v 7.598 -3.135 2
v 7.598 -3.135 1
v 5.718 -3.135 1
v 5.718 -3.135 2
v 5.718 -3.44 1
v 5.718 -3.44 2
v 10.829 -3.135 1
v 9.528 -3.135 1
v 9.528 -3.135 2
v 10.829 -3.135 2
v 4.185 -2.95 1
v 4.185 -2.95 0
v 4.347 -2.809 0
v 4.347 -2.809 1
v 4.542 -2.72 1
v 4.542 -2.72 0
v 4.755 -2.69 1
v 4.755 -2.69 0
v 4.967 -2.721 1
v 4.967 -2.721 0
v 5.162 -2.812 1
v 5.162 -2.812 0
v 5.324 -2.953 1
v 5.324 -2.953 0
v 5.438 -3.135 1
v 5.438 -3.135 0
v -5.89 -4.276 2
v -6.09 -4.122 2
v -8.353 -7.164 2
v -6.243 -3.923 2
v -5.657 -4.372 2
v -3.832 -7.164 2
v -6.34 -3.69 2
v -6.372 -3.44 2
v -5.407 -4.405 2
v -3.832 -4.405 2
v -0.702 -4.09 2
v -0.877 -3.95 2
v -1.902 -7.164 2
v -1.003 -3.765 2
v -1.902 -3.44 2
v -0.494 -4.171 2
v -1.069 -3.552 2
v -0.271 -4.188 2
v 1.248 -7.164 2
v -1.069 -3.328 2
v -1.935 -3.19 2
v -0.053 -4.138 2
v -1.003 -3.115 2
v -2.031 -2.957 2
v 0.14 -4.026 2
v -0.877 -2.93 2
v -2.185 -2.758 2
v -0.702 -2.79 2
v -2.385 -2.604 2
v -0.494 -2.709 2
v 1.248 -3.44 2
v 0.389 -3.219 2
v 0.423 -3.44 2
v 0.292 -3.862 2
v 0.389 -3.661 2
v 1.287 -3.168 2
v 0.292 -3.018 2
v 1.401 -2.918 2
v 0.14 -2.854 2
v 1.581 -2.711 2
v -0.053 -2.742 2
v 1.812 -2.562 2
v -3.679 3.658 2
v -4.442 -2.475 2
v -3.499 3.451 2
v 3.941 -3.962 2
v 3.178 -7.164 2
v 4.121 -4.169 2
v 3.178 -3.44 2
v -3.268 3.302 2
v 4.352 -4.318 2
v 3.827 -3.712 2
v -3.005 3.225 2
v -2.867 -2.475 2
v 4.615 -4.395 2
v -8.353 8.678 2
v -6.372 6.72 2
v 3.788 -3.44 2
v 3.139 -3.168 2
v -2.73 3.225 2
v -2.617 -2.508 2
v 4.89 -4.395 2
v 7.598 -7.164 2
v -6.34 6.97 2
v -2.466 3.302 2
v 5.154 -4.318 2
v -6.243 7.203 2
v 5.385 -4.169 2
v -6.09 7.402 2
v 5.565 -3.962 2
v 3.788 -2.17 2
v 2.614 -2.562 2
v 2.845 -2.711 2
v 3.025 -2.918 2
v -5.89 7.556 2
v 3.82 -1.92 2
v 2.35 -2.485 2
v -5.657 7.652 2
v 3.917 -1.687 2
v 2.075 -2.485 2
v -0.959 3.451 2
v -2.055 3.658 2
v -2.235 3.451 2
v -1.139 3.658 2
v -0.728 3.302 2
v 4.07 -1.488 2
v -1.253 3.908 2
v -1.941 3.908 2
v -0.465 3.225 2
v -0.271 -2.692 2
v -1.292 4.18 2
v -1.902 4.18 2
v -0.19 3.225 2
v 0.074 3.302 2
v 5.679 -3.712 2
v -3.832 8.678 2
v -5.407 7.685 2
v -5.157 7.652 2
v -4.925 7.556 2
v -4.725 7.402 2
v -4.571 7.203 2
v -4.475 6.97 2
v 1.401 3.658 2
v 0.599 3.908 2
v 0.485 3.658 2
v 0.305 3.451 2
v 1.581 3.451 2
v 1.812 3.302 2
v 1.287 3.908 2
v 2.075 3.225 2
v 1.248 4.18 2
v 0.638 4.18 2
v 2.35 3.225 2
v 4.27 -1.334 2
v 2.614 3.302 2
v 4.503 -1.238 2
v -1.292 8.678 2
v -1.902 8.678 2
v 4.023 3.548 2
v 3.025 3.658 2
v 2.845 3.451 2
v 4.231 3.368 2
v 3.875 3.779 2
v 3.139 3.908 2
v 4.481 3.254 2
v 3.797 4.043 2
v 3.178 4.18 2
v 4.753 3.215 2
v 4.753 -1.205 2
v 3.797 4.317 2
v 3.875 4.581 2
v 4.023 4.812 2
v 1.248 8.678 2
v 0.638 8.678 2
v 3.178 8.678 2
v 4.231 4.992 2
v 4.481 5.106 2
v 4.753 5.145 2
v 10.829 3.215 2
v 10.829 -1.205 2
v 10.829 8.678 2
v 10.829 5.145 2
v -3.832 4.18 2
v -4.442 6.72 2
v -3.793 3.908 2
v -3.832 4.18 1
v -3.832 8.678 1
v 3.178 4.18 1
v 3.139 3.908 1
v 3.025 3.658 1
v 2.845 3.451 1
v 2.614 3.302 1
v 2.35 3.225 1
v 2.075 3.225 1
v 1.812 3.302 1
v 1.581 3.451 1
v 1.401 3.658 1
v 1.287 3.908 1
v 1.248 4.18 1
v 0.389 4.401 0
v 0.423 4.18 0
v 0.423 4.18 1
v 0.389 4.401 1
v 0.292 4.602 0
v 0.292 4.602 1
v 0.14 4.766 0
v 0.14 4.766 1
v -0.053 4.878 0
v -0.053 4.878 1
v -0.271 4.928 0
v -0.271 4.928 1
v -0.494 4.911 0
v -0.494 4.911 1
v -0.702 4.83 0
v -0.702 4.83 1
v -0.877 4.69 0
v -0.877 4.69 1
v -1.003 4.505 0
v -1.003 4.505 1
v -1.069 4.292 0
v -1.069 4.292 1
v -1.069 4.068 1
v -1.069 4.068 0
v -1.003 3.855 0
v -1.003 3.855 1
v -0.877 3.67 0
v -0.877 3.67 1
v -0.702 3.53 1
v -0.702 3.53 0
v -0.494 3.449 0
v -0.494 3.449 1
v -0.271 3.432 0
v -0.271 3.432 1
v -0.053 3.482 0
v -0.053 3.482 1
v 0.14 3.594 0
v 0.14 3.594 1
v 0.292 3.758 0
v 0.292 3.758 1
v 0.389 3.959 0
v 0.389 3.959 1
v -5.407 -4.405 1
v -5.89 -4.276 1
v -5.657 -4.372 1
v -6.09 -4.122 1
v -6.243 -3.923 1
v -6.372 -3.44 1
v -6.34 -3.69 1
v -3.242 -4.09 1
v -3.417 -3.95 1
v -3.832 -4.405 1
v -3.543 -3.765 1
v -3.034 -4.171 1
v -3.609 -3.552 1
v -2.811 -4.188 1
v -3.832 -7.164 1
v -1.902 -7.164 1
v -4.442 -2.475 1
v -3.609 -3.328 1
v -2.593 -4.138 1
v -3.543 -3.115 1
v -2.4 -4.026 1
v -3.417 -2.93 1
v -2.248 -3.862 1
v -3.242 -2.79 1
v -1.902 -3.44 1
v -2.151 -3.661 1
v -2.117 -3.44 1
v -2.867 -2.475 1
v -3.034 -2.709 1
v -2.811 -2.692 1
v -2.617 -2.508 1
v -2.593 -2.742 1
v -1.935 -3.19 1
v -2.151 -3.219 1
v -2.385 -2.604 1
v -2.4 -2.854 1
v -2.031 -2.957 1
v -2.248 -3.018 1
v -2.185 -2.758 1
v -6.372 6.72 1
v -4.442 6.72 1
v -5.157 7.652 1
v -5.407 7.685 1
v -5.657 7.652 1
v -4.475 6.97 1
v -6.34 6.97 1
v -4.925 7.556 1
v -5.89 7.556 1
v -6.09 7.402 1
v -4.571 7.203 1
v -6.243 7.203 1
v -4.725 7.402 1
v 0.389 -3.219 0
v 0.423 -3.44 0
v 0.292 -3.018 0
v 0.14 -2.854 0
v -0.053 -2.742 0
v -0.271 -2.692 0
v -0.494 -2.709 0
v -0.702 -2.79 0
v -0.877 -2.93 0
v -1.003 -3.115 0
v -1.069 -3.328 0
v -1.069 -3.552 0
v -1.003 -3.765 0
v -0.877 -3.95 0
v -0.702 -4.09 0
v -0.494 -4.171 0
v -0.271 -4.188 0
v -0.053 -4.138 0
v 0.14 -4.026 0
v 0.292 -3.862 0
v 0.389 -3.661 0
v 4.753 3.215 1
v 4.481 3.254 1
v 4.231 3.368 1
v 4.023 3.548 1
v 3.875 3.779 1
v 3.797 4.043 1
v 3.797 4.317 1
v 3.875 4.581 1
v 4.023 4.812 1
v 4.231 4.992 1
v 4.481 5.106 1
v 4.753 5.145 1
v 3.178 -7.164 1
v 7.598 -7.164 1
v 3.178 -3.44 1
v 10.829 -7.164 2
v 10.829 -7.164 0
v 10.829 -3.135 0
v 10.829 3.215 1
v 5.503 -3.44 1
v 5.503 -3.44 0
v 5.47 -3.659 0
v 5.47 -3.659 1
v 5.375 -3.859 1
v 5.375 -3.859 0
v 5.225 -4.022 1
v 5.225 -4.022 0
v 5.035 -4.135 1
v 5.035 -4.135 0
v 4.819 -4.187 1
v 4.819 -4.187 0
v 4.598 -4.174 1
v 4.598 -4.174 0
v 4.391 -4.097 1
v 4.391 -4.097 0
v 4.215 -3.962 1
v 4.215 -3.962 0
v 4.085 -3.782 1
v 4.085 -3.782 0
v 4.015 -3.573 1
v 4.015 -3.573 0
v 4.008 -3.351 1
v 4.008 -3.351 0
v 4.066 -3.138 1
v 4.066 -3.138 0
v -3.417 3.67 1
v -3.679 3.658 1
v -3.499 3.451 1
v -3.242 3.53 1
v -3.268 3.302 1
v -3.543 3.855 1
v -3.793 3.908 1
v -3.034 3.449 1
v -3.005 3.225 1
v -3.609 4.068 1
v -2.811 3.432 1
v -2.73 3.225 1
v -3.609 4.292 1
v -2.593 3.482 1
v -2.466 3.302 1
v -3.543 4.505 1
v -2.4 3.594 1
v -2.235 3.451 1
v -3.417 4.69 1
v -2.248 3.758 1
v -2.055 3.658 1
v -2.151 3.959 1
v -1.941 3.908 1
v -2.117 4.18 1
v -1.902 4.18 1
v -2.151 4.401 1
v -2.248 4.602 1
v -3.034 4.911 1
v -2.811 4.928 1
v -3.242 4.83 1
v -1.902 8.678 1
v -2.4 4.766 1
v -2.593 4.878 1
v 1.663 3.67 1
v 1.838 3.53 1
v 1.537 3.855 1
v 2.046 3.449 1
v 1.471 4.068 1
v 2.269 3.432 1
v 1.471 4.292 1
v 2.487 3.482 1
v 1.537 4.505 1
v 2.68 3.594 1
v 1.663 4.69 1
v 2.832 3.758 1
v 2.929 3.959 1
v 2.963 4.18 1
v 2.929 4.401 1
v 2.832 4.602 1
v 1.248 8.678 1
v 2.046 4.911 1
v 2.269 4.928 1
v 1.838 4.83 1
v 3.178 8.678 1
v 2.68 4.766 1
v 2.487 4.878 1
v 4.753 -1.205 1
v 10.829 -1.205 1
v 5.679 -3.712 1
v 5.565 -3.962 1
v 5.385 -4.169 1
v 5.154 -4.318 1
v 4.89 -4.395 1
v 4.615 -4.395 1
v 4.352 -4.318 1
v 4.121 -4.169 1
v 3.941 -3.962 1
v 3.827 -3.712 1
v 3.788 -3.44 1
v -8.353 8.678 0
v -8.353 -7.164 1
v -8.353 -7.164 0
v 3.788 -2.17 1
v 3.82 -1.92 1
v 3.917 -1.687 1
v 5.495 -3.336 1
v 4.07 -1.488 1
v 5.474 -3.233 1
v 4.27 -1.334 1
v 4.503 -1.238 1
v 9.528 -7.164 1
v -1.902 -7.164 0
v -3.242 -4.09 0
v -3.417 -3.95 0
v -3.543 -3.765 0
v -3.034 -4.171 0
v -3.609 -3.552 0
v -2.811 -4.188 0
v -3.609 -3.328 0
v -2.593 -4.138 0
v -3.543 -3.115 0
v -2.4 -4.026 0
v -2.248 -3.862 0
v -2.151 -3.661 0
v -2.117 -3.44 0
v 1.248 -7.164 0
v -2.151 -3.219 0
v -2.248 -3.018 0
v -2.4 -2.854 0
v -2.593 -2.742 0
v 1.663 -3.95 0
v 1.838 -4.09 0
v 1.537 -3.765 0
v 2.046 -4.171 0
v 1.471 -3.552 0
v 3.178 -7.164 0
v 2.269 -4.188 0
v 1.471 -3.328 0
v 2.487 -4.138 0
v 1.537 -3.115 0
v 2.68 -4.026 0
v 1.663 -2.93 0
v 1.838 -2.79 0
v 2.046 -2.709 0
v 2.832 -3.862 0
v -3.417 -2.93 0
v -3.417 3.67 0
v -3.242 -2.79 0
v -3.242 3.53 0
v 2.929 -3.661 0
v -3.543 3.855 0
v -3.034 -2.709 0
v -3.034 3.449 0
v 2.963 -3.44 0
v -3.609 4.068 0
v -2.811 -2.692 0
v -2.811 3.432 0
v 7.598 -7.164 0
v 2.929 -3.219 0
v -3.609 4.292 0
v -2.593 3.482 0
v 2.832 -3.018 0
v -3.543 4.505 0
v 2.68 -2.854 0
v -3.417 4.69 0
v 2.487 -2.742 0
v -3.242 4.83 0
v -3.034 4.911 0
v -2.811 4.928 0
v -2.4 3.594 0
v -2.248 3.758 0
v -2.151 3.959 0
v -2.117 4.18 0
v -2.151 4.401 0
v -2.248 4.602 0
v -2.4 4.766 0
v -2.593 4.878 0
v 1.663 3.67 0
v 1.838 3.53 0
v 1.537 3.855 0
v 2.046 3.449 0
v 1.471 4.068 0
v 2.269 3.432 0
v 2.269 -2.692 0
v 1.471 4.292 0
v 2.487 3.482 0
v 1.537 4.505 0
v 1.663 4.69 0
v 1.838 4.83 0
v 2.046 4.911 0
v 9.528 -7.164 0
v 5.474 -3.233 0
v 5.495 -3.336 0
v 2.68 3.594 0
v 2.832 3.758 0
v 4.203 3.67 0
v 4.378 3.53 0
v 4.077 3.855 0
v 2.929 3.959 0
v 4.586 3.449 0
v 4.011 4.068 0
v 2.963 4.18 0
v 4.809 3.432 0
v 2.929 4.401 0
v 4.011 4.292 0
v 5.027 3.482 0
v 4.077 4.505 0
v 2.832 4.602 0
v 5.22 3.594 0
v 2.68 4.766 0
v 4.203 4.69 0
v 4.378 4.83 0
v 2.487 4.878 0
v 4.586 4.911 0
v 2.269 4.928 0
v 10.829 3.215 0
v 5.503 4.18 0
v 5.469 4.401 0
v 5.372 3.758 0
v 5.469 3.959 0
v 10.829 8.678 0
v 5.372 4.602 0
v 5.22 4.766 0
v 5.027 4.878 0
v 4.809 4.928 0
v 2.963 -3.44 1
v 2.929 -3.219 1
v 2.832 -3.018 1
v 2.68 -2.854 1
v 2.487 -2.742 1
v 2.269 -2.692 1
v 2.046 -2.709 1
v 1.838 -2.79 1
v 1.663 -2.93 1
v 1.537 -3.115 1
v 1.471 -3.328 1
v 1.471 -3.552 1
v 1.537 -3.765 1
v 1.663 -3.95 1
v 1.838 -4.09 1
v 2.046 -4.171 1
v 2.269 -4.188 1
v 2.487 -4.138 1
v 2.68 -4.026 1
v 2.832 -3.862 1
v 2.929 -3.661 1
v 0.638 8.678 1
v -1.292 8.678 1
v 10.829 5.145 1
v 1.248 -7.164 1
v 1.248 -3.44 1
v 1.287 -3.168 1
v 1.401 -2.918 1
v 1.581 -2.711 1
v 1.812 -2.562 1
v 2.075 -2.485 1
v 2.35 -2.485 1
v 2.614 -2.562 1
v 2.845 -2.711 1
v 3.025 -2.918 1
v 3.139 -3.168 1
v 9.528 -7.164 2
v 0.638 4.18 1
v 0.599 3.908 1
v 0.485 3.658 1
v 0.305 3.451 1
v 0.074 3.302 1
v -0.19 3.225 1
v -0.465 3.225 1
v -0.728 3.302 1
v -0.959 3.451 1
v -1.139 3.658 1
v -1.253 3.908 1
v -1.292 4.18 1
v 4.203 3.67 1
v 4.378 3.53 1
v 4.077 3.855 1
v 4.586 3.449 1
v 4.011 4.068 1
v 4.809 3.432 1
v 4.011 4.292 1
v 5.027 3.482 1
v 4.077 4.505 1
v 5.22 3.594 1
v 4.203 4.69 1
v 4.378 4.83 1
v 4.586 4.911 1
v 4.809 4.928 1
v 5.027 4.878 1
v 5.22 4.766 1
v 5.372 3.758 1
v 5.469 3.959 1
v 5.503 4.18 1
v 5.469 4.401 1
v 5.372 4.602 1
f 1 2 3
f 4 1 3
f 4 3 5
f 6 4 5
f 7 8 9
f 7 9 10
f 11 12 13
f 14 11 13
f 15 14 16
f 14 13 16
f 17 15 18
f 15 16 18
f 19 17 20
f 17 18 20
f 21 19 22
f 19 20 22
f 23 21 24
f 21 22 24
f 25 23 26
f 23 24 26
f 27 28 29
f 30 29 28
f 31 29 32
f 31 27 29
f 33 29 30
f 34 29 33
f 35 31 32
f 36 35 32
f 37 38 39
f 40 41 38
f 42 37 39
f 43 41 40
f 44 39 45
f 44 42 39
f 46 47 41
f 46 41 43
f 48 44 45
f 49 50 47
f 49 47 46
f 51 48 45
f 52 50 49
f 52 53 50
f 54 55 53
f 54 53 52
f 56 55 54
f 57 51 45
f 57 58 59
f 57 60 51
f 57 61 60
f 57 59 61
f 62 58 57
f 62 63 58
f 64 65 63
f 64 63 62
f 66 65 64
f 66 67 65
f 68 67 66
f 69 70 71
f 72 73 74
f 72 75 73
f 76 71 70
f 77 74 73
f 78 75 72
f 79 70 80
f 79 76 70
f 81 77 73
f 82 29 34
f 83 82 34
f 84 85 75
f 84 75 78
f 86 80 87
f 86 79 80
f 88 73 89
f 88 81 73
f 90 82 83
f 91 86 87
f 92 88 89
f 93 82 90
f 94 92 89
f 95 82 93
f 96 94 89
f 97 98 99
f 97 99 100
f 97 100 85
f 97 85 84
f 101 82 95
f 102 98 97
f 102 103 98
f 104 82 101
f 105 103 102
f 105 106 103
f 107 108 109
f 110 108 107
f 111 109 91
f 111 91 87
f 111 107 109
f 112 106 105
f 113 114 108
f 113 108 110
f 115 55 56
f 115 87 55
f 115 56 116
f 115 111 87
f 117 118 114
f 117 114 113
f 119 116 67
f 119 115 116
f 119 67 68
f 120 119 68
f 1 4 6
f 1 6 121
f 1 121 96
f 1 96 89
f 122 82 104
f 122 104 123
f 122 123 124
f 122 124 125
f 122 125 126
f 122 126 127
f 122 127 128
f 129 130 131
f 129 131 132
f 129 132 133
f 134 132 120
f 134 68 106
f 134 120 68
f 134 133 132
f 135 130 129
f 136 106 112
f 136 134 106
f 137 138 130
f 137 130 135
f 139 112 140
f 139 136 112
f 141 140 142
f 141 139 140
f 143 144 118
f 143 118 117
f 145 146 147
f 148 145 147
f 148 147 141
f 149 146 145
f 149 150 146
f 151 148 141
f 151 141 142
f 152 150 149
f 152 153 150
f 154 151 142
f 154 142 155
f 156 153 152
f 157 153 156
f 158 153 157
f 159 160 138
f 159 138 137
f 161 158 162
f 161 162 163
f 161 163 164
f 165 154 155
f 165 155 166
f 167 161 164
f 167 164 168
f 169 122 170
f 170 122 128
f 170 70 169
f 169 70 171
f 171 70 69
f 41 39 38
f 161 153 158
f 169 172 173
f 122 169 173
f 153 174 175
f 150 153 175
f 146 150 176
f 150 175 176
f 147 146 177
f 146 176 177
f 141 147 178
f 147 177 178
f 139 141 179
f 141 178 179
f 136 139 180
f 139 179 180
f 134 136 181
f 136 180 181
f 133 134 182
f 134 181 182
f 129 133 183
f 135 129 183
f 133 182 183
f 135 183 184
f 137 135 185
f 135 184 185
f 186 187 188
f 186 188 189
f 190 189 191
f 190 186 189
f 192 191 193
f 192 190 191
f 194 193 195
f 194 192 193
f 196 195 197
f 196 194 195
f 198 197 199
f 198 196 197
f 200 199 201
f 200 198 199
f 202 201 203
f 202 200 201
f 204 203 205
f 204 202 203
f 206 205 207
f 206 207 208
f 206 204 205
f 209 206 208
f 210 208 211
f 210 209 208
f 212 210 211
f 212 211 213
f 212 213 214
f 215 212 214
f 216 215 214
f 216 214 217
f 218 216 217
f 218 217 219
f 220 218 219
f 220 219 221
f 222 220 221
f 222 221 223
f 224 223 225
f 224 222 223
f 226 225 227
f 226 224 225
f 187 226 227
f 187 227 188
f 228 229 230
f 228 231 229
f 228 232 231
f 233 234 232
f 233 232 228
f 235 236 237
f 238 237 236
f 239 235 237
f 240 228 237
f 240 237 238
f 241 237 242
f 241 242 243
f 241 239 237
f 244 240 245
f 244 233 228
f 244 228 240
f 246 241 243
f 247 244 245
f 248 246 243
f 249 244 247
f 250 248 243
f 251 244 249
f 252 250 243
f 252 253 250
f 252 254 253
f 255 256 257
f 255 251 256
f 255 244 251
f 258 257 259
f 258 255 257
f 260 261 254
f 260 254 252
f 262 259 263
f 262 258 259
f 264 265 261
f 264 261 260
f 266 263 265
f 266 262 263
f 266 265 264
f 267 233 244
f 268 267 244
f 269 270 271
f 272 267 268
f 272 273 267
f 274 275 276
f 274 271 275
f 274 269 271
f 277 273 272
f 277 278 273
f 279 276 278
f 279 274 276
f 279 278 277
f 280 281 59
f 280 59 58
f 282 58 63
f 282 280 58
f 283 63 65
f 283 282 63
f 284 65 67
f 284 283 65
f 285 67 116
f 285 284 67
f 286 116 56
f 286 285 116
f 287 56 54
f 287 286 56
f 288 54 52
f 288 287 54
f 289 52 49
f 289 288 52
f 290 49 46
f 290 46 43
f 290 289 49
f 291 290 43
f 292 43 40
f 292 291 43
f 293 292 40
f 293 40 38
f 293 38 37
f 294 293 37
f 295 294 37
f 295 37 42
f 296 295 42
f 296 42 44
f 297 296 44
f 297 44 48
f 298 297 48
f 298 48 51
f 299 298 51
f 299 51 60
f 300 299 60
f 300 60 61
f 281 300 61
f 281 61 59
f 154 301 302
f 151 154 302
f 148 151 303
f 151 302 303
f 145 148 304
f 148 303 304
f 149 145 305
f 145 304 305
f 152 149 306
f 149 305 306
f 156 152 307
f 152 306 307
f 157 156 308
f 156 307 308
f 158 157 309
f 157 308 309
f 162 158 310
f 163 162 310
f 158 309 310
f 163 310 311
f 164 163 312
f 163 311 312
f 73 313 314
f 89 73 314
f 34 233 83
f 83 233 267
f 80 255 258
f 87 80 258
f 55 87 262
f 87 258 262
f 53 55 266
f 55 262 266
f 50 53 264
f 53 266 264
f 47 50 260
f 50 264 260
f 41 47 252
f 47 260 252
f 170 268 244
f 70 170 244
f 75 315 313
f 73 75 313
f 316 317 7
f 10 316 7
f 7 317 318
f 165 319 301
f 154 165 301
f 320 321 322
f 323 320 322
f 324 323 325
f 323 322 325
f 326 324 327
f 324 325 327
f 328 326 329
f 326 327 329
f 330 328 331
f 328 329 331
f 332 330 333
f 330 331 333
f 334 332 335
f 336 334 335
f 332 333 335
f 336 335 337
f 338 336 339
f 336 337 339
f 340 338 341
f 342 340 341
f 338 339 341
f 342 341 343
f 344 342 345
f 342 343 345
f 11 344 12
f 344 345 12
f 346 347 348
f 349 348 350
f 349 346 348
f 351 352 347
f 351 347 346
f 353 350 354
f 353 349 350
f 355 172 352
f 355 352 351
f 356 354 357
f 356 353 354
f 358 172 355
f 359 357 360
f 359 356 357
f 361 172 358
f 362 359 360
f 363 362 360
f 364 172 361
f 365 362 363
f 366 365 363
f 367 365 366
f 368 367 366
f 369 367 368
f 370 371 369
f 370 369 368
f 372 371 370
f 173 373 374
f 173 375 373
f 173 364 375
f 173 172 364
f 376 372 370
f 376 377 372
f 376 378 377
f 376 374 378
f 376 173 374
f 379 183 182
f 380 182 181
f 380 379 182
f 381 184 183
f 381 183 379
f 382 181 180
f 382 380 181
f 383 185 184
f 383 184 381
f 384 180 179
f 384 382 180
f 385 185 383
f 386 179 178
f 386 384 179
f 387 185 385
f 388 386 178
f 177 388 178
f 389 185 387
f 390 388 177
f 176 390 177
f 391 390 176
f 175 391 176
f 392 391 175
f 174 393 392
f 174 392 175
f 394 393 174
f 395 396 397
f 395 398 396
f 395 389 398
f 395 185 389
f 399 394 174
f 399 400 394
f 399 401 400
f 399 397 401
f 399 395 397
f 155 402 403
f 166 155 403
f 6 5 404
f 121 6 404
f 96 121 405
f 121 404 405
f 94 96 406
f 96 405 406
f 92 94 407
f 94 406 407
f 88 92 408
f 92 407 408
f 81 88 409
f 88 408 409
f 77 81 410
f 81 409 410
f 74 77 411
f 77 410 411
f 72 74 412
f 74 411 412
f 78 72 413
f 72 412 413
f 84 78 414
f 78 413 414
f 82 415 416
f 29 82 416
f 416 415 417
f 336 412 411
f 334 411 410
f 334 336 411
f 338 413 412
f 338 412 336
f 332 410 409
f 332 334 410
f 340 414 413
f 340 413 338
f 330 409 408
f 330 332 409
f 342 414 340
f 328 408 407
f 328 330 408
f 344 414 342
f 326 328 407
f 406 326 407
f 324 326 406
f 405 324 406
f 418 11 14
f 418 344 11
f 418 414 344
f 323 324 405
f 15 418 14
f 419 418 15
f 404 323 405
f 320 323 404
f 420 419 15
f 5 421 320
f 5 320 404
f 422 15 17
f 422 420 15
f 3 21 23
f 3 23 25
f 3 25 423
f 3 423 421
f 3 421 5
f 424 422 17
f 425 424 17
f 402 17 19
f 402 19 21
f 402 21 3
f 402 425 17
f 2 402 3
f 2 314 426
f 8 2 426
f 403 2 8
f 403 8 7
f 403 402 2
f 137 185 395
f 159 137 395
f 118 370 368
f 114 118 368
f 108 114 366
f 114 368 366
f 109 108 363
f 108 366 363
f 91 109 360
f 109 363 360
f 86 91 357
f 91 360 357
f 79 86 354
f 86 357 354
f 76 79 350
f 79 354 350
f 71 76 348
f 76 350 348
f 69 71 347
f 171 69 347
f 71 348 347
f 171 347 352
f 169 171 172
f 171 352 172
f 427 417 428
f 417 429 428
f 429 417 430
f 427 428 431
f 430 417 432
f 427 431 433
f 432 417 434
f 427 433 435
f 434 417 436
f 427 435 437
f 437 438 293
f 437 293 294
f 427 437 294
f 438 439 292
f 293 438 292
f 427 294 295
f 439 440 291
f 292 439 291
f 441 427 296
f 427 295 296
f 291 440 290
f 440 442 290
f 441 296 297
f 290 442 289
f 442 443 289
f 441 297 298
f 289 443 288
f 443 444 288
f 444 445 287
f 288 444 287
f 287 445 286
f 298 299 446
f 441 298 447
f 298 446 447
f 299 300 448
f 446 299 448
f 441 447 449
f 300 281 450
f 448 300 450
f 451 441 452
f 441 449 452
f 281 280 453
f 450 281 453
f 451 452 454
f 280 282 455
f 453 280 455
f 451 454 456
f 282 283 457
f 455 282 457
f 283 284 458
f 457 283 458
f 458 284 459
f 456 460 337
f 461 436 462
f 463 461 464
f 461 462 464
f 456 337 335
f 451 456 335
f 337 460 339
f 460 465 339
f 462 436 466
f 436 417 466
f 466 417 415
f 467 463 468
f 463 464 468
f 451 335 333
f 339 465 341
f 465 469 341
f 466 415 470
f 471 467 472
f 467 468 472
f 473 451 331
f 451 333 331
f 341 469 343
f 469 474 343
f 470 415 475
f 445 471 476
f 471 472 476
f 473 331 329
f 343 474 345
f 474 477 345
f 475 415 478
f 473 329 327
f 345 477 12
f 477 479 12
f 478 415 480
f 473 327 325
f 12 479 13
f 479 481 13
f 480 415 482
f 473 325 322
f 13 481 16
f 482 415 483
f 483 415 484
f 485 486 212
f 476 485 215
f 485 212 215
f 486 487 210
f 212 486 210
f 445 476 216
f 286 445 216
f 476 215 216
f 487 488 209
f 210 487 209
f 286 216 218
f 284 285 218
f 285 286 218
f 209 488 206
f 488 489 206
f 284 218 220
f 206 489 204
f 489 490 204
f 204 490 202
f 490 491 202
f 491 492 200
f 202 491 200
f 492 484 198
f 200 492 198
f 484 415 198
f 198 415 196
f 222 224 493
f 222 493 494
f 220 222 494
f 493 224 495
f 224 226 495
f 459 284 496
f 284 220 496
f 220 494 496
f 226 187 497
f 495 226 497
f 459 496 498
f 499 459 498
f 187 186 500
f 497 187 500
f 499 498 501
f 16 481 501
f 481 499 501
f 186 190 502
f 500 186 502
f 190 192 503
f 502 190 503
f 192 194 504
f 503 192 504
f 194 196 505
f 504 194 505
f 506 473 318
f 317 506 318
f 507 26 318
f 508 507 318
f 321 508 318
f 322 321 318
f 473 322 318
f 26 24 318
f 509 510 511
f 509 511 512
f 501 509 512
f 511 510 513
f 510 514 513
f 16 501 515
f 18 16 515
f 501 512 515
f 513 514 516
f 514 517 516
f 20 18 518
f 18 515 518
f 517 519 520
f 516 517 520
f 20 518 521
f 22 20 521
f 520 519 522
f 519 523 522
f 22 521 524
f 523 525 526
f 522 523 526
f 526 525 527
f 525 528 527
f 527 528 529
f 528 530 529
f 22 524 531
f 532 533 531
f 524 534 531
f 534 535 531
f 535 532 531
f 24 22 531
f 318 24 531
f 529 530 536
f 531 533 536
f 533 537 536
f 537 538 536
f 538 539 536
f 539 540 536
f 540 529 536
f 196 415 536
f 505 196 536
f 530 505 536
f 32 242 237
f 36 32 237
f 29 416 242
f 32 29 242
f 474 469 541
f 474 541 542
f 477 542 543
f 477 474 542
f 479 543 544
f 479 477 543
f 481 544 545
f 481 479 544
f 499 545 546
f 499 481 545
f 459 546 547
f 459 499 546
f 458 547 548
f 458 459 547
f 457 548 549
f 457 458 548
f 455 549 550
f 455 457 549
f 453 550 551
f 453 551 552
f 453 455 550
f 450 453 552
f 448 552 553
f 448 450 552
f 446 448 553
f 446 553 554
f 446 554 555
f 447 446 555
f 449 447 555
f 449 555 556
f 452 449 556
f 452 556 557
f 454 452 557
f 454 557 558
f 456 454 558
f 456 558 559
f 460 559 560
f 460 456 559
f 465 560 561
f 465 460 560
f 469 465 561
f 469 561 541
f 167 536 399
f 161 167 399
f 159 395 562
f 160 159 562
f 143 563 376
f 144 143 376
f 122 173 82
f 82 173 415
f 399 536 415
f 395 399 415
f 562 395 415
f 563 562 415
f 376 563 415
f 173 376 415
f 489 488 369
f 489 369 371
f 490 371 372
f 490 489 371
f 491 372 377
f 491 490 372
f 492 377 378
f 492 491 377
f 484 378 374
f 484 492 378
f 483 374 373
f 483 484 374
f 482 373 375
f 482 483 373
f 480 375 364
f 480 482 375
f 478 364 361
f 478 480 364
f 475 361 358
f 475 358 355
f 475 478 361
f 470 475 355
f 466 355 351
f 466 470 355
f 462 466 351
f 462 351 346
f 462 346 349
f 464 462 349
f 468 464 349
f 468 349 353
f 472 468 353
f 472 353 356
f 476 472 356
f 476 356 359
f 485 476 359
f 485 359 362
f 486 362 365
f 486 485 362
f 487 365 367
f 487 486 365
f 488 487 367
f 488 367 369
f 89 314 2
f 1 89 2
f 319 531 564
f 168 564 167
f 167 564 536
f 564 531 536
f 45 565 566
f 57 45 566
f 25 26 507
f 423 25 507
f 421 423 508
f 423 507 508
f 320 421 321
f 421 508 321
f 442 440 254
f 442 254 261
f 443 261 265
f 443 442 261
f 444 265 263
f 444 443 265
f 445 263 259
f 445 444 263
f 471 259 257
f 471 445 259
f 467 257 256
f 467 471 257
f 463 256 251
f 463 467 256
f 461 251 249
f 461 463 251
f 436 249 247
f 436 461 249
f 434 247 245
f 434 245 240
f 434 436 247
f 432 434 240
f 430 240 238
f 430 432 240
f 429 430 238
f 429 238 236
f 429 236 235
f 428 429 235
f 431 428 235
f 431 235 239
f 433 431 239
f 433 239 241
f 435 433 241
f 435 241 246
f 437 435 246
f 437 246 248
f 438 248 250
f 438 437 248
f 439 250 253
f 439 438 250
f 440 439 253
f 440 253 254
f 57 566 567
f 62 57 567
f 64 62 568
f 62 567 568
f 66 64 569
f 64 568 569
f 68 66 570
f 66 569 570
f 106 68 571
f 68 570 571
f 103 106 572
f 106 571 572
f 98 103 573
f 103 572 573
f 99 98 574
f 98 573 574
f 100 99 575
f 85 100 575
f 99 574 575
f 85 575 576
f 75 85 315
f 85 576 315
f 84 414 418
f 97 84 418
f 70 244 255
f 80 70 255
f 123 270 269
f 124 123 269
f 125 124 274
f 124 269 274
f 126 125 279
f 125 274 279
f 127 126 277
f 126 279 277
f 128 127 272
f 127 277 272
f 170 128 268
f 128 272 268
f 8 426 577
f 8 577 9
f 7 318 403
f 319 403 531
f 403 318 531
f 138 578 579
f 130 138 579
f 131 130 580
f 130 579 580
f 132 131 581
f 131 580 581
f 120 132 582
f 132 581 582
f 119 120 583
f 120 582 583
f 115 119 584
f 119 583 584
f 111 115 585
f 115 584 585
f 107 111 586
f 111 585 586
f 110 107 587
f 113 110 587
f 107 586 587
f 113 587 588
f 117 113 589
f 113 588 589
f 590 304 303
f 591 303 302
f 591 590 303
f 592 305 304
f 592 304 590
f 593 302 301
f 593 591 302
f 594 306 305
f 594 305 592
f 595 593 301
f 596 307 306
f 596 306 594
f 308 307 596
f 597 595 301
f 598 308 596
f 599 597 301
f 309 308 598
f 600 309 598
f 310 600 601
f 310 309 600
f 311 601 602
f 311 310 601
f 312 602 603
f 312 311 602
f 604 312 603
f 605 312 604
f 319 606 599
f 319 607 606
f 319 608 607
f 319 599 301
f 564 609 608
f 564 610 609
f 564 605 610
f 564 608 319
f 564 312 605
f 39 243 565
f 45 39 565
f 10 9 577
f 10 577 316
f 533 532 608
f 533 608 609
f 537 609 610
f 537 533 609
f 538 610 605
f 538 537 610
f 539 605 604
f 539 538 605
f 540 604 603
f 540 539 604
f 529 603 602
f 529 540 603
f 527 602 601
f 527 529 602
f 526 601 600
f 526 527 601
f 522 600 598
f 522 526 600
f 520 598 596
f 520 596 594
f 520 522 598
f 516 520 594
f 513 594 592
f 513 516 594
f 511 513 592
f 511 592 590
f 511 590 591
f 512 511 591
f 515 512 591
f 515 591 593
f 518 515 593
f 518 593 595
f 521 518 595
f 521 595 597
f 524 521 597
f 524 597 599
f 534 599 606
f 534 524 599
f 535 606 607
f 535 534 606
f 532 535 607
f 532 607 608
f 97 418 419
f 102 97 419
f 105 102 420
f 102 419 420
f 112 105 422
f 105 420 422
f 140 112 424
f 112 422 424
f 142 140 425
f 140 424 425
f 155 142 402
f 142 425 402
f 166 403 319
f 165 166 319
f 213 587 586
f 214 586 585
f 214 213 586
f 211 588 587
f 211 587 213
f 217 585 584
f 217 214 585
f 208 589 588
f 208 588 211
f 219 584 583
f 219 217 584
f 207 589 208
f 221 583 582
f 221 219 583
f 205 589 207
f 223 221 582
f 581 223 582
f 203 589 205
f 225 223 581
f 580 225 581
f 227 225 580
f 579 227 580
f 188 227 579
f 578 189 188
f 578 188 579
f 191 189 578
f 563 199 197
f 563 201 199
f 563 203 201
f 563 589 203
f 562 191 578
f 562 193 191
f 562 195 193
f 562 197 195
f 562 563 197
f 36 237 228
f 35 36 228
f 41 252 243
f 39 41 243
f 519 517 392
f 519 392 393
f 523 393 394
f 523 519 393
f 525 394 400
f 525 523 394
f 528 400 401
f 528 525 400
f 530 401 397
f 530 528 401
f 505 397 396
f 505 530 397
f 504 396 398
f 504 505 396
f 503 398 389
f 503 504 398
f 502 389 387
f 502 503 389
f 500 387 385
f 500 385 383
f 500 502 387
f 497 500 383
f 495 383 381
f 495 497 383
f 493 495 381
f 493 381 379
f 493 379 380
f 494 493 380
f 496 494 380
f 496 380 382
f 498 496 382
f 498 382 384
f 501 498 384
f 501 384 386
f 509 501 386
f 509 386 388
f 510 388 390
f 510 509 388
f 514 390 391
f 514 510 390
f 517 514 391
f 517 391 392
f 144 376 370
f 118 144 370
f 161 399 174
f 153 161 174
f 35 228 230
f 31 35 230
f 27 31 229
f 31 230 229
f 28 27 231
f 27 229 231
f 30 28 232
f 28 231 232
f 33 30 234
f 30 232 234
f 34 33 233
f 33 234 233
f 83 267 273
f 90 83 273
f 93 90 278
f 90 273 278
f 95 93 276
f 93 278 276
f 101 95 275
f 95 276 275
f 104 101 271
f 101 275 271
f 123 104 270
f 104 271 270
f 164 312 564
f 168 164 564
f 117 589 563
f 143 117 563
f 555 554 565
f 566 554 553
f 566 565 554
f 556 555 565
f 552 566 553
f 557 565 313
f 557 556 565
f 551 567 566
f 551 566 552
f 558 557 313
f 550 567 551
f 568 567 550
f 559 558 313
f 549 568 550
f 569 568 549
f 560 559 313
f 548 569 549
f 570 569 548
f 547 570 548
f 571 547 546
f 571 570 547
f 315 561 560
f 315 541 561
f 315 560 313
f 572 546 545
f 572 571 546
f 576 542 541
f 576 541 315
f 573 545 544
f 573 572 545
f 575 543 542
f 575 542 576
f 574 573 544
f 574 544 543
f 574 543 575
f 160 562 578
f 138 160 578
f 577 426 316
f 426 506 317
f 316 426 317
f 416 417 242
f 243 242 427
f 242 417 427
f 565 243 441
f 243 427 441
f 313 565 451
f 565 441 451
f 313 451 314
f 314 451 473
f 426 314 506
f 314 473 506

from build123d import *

# Parameters (mm, degrees)
F0_R     = 0.75
F0_W     = 1.3011230478
F0_H     = 4.0286443567
F1_DEPTH = 1
F2_DEPTH = 2


with BuildPart() as f1:
    # F0 (on Top) → F1 (new body)
    with BuildSketch(Plane.XY):
        with BuildLine():
            Line((-3.8324738853, 4.1799998197), (-3.8324738853, 8.6784018204))
            Line((-3.8324738853, 8.6784018204), (-8.3529148251, 8.6784018204))
            Line((-8.3529148251, 8.6784018204), (-8.3529148251, -7.163844537))
            Line((-8.3529148251, -7.163844537), (-3.8324738853, -7.163844537))
            Line((-3.8324738853, -7.163844537), (-3.8324738853, -4.4052001803))
            Line((-3.8324738853, -4.4052001803), (-5.4072738853, -4.4052001803))
            ThreePointArc((-5.4072738853, -4.4052001803), (-6.0897733505, -4.1224996455), (-6.3724738853, -3.4400001803))
            Line((-6.3724738853, -3.4400001803), (-6.3724738853, 6.7199998197))
            ThreePointArc((-6.3724738853, 6.7199998197), (-6.0897733505, 7.4024992849), (-5.4072738853, 7.6851998197))
            ThreePointArc((-5.4072738853, 7.6851998197), (-4.7247744201, 7.4024992849), (-4.4420738853, 6.7199998197))
            Line((-4.4420738853, 6.7199998197), (-4.4420738853, -2.4748001803))
            Line((-4.4420738853, -2.4748001803), (-2.8672738853, -2.4748001803))
            ThreePointArc((-2.8672738853, -2.4748001803), (-2.1847744201, -2.7575007151), (-1.9020738853, -3.4400001803))
            Line((-1.9020738853, -3.4400001803), (-1.9020738853, -7.163844537))
            Line((-1.9020738853, -7.163844537), (1.2475261147, -7.163844537))
            Line((1.2475261147, -7.163844537), (1.2475261147, -3.4400001803))
            ThreePointArc((1.2475261147, -3.4400001803), (2.2127261147, -2.4748001803), (3.1779261147, -3.4400001803))
            Line((3.1779261147, -3.4400001803), (3.1779261147, -7.163844537))
            Line((3.1779261147, -7.163844537), (7.5975261147, -7.163844537))
            Line((7.5975261147, -7.163844537), (7.5975261147, -3.1352001803))
            Line((7.5975261147, -3.1352001803), (5.7179261147, -3.1352001803))
            Line((5.7179261147, -3.1352001803), (5.7179261147, -3.4400001803))
            ThreePointArc((5.7179261147, -3.4400001803), (4.7527261147, -4.4052001803), (3.7875261147, -3.4400001803))
            Line((3.7875261147, -3.4400001803), (3.7875261147, -2.1700001803))
            ThreePointArc((3.7875261147, -2.1700001803), (4.0702266495, -1.4875007151), (4.7527261147, -1.2048001803))
            Line((4.7527261147, -1.2048001803), (8.5627261147, -1.2048001803))
            Line((8.5627261147, -1.2048001803), (10.8290491626, -1.2048001803))
            Line((10.8290491626, -1.2048001803), (10.8290491626, 3.2147998197))
            Line((10.8290491626, 3.2147998197), (4.7527261147, 3.2147998197))
            ThreePointArc((4.7527261147, 3.2147998197), (3.7875261147, 4.1799998197), (4.7527261147, 5.1451998197))
            Line((4.7527261147, 5.1451998197), (10.8290491626, 5.1451998197))
            Line((10.8290491626, 5.1451998197), (10.8290491626, 8.6784018204))
            Line((10.8290491626, 8.6784018204), (3.1779261147, 8.6784018204))
            Line((3.1779261147, 8.6784018204), (3.1779261147, 4.1799998197))
            ThreePointArc((3.1779261147, 4.1799998197), (2.2127261147, 3.2147998197), (1.2475261147, 4.1799998197))
            Line((1.2475261147, 4.1799998197), (1.2475261147, 8.6784018204))
            Line((1.2475261147, 8.6784018204), (0.6379261147, 8.6784018204))
            Line((0.6379261147, 8.6784018204), (0.6379261147, 4.1799998197))
            ThreePointArc((0.6379261147, 4.1799998197), (-0.3272738853, 3.2147998197), (-1.2924738853, 4.1799998197))
            Line((-1.2924738853, 4.1799998197), (-1.2924738853, 8.6784018204))
            Line((-1.2924738853, 8.6784018204), (-1.9020738853, 8.6784018204))
            Line((-1.9020738853, 8.6784018204), (-1.9020738853, 4.1799998197))
            ThreePointArc((-1.9020738853, 4.1799998197), (-2.8672738853, 3.2147998197), (-3.8324738853, 4.1799998197))
        make_face()
        with Locations((-0.3272738853, -3.4400001803)):
            Circle(F0_R, mode=Mode.SUBTRACT)
        with Locations((10.1784876386, -5.1495223586)):
            Rectangle(F0_W, F0_H)
        with BuildLine():
            Line((-6.3724738853, 6.7199998197), (-6.3724738853, -3.4400001803))
            ThreePointArc((-6.3724738853, -3.4400001803), (-6.0897733505, -2.7575007151), (-5.4072738853, -2.4748001803))
            Line((-5.4072738853, -2.4748001803), (-4.4420738853, -2.4748001803))
            Line((-4.4420738853, -2.4748001803), (-4.4420738853, 6.7199998197))
            ThreePointArc((-4.4420738853, 6.7199998197), (-4.7247744201, 7.4024992849), (-5.4072738853, 7.6851998197))
            ThreePointArc((-5.4072738853, 7.6851998197), (-6.0897733505, 7.4024992849), (-6.3724738853, 6.7199998197))
        make_face()
        with BuildLine():
            ThreePointArc((-6.3724738853, -3.4400001803), (-6.0897733505, -4.1224996455), (-5.4072738853, -4.4052001803))
            ThreePointArc((-5.4072738853, -4.4052001803), (-4.7247744201, -4.1224996455), (-4.4420738853, -3.4400001803))
            Line((-4.4420738853, -3.4400001803), (-4.4420738853, -2.4748001803))
            Line((-4.4420738853, -2.4748001803), (-5.4072738853, -2.4748001803))
            ThreePointArc((-5.4072738853, -2.4748001803), (-6.0897733505, -2.7575007151), (-6.3724738853, -3.4400001803))
        make_face()
        with BuildLine():
            Line((-5.4072738853, -4.4052001803), (-3.8324738853, -4.4052001803))
            Line((-3.8324738853, -4.4052001803), (-3.8324738853, -3.4400001803))
            ThreePointArc((-3.8324738853, -3.4400001803), (-3.5497733505, -2.7575007151), (-2.8672738853, -2.4748001803))
            Line((-2.8672738853, -2.4748001803), (-4.4420738853, -2.4748001803))
            Line((-4.4420738853, -2.4748001803), (-4.4420738853, -3.4400001803))
            ThreePointArc((-4.4420738853, -3.4400001803), (-4.7247744201, -4.1224996455), (-5.4072738853, -4.4052001803))
        make_face()
        with BuildLine():
            Line((-3.8324738853, -3.4400001803), (-3.8324738853, -4.4052001803))
            Line((-3.8324738853, -4.4052001803), (-2.8672738853, -4.4052001803))
            ThreePointArc((-2.8672738853, -4.4052001803), (-2.1847744201, -4.1224996455), (-1.9020738853, -3.4400001803))
            ThreePointArc((-1.9020738853, -3.4400001803), (-2.1847744201, -2.7575007151), (-2.8672738853, -2.4748001803))
            ThreePointArc((-2.8672738853, -2.4748001803), (-3.5497733505, -2.7575007151), (-3.8324738853, -3.4400001803))
        make_face()
        with Locations((-2.8672738853, -3.4400001803)):
            Circle(F0_R, mode=Mode.SUBTRACT)
        with BuildLine():
            Line((-3.8324738853, -4.4052001803), (-3.8324738853, -7.163844537))
            Line((-3.8324738853, -7.163844537), (-1.9020738853, -7.163844537))
            Line((-1.9020738853, -7.163844537), (-1.9020738853, -3.4400001803))
            ThreePointArc((-1.9020738853, -3.4400001803), (-2.1847744201, -4.1224996455), (-2.8672738853, -4.4052001803))
            Line((-2.8672738853, -4.4052001803), (-3.8324738853, -4.4052001803))
        make_face()
        with BuildLine():
            Line((1.2475261147, -3.4400001803), (1.2475261147, -7.163844537))
            Line((1.2475261147, -7.163844537), (3.1779261147, -7.163844537))
            Line((3.1779261147, -7.163844537), (3.1779261147, -3.4400001803))
            ThreePointArc((3.1779261147, -3.4400001803), (2.2127261147, -2.4748001803), (1.2475261147, -3.4400001803))
        make_face()
        with Locations((2.2127261147, -3.4400001803)):
            Circle(F0_R, mode=Mode.SUBTRACT)
        with BuildLine():
            Line((5.4379975646, -3.1352001803), (5.7179261147, -3.1352001803))
            Line((5.7179261147, -3.1352001803), (5.7179261147, -2.1700001803))
            ThreePointArc((5.7179261147, -2.1700001803), (5.4352255799, -1.4875007151), (4.7527261147, -1.2048001803))
            ThreePointArc((4.7527261147, -1.2048001803), (4.0702266495, -1.4875007151), (3.7875261147, -2.1700001803))
            ThreePointArc((3.7875261147, -2.1700001803), (3.8925168089, -2.607779794), (4.1846479344, -2.9503194874))
            ThreePointArc((4.1846479344, -2.9503194874), (4.8621737427, -2.6980290106), (5.4379975646, -3.1352001803))
        make_face()
        with BuildLine():
            Line((5.7179261147, -3.4400001803), (5.7179261147, -3.1352001803))
            Line((5.7179261147, -3.1352001803), (5.4379975646, -3.1352001803))
            ThreePointArc((5.4379975646, -3.1352001803), (5.4863655314, -3.2842015722), (5.5027261147, -3.4400001803))
            ThreePointArc((5.5027261147, -3.4400001803), (4.4915352221, -4.1430501911), (4.1846479344, -2.9503194874))
            ThreePointArc((4.1846479344, -2.9503194874), (3.8925168089, -2.607779794), (3.7875261147, -2.1700001803))
            Line((3.7875261147, -2.1700001803), (3.7875261147, -3.4400001803))
            ThreePointArc((3.7875261147, -3.4400001803), (4.7527261147, -4.4052001803), (5.7179261147, -3.4400001803))
        make_face()
        with BuildLine():
            Line((5.7179261147, -3.1352001803), (7.5975261147, -3.1352001803))
            Line((7.5975261147, -3.1352001803), (7.5975261147, -2.1700001803))
            ThreePointArc((7.5975261147, -2.1700001803), (7.8802266495, -1.4875007151), (8.5627261147, -1.2048001803))
            Line((8.5627261147, -1.2048001803), (4.7527261147, -1.2048001803))
            ThreePointArc((4.7527261147, -1.2048001803), (5.4352255799, -1.4875007151), (5.7179261147, -2.1700001803))
            Line((5.7179261147, -2.1700001803), (5.7179261147, -3.1352001803))
        make_face()
        with BuildLine():
            Line((9.5279261147, -2.1700001803), (9.5279261147, -3.1352001803))
            Line((9.5279261147, -3.1352001803), (10.8290491626, -3.1352001803))
            Line((10.8290491626, -3.1352001803), (10.8290491626, -1.2048001803))
            Line((10.8290491626, -1.2048001803), (8.5627261147, -1.2048001803))
            ThreePointArc((8.5627261147, -1.2048001803), (9.2452255799, -1.4875007151), (9.5279261147, -2.1700001803))
        make_face()
        with BuildLine():
            ThreePointArc((7.5975261147, -2.1700001803), (7.8802266495, -2.8524996455), (8.5627261147, -3.1352001803))
            ThreePointArc((8.5627261147, -3.1352001803), (9.2452255799, -2.8524996455), (9.5279261147, -2.1700001803))
            ThreePointArc((9.5279261147, -2.1700001803), (9.2452255799, -1.4875007151), (8.5627261147, -1.2048001803))
            ThreePointArc((8.5627261147, -1.2048001803), (7.8802266495, -1.4875007151), (7.5975261147, -2.1700001803))
        make_face()
        Polygon((7.5975261147, -3.1352001803), (7.5975261147, -7.163844537), (9.5279261147, -7.163844537), (9.5279261147, -3.1352001803), (8.5627261147, -3.1352001803), align=None)
        with BuildLine():
            Line((7.5975261147, -2.1700001803), (7.5975261147, -3.1352001803))
            Line((7.5975261147, -3.1352001803), (8.5627261147, -3.1352001803))
            ThreePointArc((8.5627261147, -3.1352001803), (7.8802266495, -2.8524996455), (7.5975261147, -2.1700001803))
        make_face()
        with BuildLine():
            ThreePointArc((9.5279261147, -2.1700001803), (9.2452255799, -2.8524996455), (8.5627261147, -3.1352001803))
            Line((8.5627261147, -3.1352001803), (9.5279261147, -3.1352001803))
            Line((9.5279261147, -3.1352001803), (9.5279261147, -2.1700001803))
        make_face()
        with BuildLine():
            Line((10.8290491626, 3.2147998197), (10.8290491626, 5.1451998197))
            Line((10.8290491626, 5.1451998197), (4.7527261147, 5.1451998197))
            ThreePointArc((4.7527261147, 5.1451998197), (3.7875261147, 4.1799998197), (4.7527261147, 3.2147998197))
            Line((4.7527261147, 3.2147998197), (10.8290491626, 3.2147998197))
        make_face()
        with Locations((4.7527261147, 4.1799998197)):
            Circle(F0_R, mode=Mode.SUBTRACT)
        with BuildLine():
            Line((3.1779261147, 8.6784018204), (1.2475261147, 8.6784018204))
            Line((1.2475261147, 8.6784018204), (1.2475261147, 4.1799998197))
            ThreePointArc((1.2475261147, 4.1799998197), (2.2127261147, 3.2147998197), (3.1779261147, 4.1799998197))
            Line((3.1779261147, 4.1799998197), (3.1779261147, 8.6784018204))
        make_face()
        with Locations((2.2127261147, 4.1799998197)):
            Circle(F0_R, mode=Mode.SUBTRACT)
        with BuildLine():
            Line((0.6379261147, 8.6784018204), (-1.2924738853, 8.6784018204))
            Line((-1.2924738853, 8.6784018204), (-1.2924738853, 4.1799998197))
            ThreePointArc((-1.2924738853, 4.1799998197), (-0.3272738853, 3.2147998197), (0.6379261147, 4.1799998197))
            Line((0.6379261147, 4.1799998197), (0.6379261147, 8.6784018204))
        make_face()
        with Locations((-0.3272738853, 4.1799998197)):
            Circle(F0_R, mode=Mode.SUBTRACT)
        with BuildLine():
            Line((-1.9020738853, 8.6784018204), (-3.8324738853, 8.6784018204))
            Line((-3.8324738853, 8.6784018204), (-3.8324738853, 4.1799998197))
            ThreePointArc((-3.8324738853, 4.1799998197), (-2.8672738853, 3.2147998197), (-1.9020738853, 4.1799998197))
            Line((-1.9020738853, 4.1799998197), (-1.9020738853, 8.6784018204))
        make_face()
        with Locations((-2.8672738853, 4.1799998197)):
            Circle(F0_R, mode=Mode.SUBTRACT)
    extrude(amount=F1_DEPTH)

    # F0 (on Top) → F2 (join)
    with BuildSketch(Plane.XY):
        with BuildLine():
            Line((-3.8324738853, 4.1799998197), (-3.8324738853, 8.6784018204))
            Line((-3.8324738853, 8.6784018204), (-8.3529148251, 8.6784018204))
            Line((-8.3529148251, 8.6784018204), (-8.3529148251, -7.163844537))
            Line((-8.3529148251, -7.163844537), (-3.8324738853, -7.163844537))
            Line((-3.8324738853, -7.163844537), (-3.8324738853, -4.4052001803))
            Line((-3.8324738853, -4.4052001803), (-5.4072738853, -4.4052001803))
            ThreePointArc((-5.4072738853, -4.4052001803), (-6.0897733505, -4.1224996455), (-6.3724738853, -3.4400001803))
            Line((-6.3724738853, -3.4400001803), (-6.3724738853, 6.7199998197))
            ThreePointArc((-6.3724738853, 6.7199998197), (-6.0897733505, 7.4024992849), (-5.4072738853, 7.6851998197))
            ThreePointArc((-5.4072738853, 7.6851998197), (-4.7247744201, 7.4024992849), (-4.4420738853, 6.7199998197))
            Line((-4.4420738853, 6.7199998197), (-4.4420738853, -2.4748001803))
            Line((-4.4420738853, -2.4748001803), (-2.8672738853, -2.4748001803))
            ThreePointArc((-2.8672738853, -2.4748001803), (-2.1847744201, -2.7575007151), (-1.9020738853, -3.4400001803))
            Line((-1.9020738853, -3.4400001803), (-1.9020738853, -7.163844537))
            Line((-1.9020738853, -7.163844537), (1.2475261147, -7.163844537))
            Line((1.2475261147, -7.163844537), (1.2475261147, -3.4400001803))
            ThreePointArc((1.2475261147, -3.4400001803), (2.2127261147, -2.4748001803), (3.1779261147, -3.4400001803))
            Line((3.1779261147, -3.4400001803), (3.1779261147, -7.163844537))
            Line((3.1779261147, -7.163844537), (7.5975261147, -7.163844537))
            Line((7.5975261147, -7.163844537), (7.5975261147, -3.1352001803))
            Line((7.5975261147, -3.1352001803), (5.7179261147, -3.1352001803))
            Line((5.7179261147, -3.1352001803), (5.7179261147, -3.4400001803))
            ThreePointArc((5.7179261147, -3.4400001803), (4.7527261147, -4.4052001803), (3.7875261147, -3.4400001803))
            Line((3.7875261147, -3.4400001803), (3.7875261147, -2.1700001803))
            ThreePointArc((3.7875261147, -2.1700001803), (4.0702266495, -1.4875007151), (4.7527261147, -1.2048001803))
            Line((4.7527261147, -1.2048001803), (8.5627261147, -1.2048001803))
            Line((8.5627261147, -1.2048001803), (10.8290491626, -1.2048001803))
            Line((10.8290491626, -1.2048001803), (10.8290491626, 3.2147998197))
            Line((10.8290491626, 3.2147998197), (4.7527261147, 3.2147998197))
            ThreePointArc((4.7527261147, 3.2147998197), (3.7875261147, 4.1799998197), (4.7527261147, 5.1451998197))
            Line((4.7527261147, 5.1451998197), (10.8290491626, 5.1451998197))
            Line((10.8290491626, 5.1451998197), (10.8290491626, 8.6784018204))
            Line((10.8290491626, 8.6784018204), (3.1779261147, 8.6784018204))
            Line((3.1779261147, 8.6784018204), (3.1779261147, 4.1799998197))
            ThreePointArc((3.1779261147, 4.1799998197), (2.2127261147, 3.2147998197), (1.2475261147, 4.1799998197))
            Line((1.2475261147, 4.1799998197), (1.2475261147, 8.6784018204))
            Line((1.2475261147, 8.6784018204), (0.6379261147, 8.6784018204))
            Line((0.6379261147, 8.6784018204), (0.6379261147, 4.1799998197))
            ThreePointArc((0.6379261147, 4.1799998197), (-0.3272738853, 3.2147998197), (-1.2924738853, 4.1799998197))
            Line((-1.2924738853, 4.1799998197), (-1.2924738853, 8.6784018204))
            Line((-1.2924738853, 8.6784018204), (-1.9020738853, 8.6784018204))
            Line((-1.9020738853, 8.6784018204), (-1.9020738853, 4.1799998197))
            ThreePointArc((-1.9020738853, 4.1799998197), (-2.8672738853, 3.2147998197), (-3.8324738853, 4.1799998197))
        make_face()
        with Locations((-0.3272738853, -3.4400001803)):
            Circle(F0_R, mode=Mode.SUBTRACT)
        with Locations((10.1784876386, -5.1495223586)):
            Rectangle(F0_W, F0_H)
    extrude(amount=F2_DEPTH)


solid = f1.part
